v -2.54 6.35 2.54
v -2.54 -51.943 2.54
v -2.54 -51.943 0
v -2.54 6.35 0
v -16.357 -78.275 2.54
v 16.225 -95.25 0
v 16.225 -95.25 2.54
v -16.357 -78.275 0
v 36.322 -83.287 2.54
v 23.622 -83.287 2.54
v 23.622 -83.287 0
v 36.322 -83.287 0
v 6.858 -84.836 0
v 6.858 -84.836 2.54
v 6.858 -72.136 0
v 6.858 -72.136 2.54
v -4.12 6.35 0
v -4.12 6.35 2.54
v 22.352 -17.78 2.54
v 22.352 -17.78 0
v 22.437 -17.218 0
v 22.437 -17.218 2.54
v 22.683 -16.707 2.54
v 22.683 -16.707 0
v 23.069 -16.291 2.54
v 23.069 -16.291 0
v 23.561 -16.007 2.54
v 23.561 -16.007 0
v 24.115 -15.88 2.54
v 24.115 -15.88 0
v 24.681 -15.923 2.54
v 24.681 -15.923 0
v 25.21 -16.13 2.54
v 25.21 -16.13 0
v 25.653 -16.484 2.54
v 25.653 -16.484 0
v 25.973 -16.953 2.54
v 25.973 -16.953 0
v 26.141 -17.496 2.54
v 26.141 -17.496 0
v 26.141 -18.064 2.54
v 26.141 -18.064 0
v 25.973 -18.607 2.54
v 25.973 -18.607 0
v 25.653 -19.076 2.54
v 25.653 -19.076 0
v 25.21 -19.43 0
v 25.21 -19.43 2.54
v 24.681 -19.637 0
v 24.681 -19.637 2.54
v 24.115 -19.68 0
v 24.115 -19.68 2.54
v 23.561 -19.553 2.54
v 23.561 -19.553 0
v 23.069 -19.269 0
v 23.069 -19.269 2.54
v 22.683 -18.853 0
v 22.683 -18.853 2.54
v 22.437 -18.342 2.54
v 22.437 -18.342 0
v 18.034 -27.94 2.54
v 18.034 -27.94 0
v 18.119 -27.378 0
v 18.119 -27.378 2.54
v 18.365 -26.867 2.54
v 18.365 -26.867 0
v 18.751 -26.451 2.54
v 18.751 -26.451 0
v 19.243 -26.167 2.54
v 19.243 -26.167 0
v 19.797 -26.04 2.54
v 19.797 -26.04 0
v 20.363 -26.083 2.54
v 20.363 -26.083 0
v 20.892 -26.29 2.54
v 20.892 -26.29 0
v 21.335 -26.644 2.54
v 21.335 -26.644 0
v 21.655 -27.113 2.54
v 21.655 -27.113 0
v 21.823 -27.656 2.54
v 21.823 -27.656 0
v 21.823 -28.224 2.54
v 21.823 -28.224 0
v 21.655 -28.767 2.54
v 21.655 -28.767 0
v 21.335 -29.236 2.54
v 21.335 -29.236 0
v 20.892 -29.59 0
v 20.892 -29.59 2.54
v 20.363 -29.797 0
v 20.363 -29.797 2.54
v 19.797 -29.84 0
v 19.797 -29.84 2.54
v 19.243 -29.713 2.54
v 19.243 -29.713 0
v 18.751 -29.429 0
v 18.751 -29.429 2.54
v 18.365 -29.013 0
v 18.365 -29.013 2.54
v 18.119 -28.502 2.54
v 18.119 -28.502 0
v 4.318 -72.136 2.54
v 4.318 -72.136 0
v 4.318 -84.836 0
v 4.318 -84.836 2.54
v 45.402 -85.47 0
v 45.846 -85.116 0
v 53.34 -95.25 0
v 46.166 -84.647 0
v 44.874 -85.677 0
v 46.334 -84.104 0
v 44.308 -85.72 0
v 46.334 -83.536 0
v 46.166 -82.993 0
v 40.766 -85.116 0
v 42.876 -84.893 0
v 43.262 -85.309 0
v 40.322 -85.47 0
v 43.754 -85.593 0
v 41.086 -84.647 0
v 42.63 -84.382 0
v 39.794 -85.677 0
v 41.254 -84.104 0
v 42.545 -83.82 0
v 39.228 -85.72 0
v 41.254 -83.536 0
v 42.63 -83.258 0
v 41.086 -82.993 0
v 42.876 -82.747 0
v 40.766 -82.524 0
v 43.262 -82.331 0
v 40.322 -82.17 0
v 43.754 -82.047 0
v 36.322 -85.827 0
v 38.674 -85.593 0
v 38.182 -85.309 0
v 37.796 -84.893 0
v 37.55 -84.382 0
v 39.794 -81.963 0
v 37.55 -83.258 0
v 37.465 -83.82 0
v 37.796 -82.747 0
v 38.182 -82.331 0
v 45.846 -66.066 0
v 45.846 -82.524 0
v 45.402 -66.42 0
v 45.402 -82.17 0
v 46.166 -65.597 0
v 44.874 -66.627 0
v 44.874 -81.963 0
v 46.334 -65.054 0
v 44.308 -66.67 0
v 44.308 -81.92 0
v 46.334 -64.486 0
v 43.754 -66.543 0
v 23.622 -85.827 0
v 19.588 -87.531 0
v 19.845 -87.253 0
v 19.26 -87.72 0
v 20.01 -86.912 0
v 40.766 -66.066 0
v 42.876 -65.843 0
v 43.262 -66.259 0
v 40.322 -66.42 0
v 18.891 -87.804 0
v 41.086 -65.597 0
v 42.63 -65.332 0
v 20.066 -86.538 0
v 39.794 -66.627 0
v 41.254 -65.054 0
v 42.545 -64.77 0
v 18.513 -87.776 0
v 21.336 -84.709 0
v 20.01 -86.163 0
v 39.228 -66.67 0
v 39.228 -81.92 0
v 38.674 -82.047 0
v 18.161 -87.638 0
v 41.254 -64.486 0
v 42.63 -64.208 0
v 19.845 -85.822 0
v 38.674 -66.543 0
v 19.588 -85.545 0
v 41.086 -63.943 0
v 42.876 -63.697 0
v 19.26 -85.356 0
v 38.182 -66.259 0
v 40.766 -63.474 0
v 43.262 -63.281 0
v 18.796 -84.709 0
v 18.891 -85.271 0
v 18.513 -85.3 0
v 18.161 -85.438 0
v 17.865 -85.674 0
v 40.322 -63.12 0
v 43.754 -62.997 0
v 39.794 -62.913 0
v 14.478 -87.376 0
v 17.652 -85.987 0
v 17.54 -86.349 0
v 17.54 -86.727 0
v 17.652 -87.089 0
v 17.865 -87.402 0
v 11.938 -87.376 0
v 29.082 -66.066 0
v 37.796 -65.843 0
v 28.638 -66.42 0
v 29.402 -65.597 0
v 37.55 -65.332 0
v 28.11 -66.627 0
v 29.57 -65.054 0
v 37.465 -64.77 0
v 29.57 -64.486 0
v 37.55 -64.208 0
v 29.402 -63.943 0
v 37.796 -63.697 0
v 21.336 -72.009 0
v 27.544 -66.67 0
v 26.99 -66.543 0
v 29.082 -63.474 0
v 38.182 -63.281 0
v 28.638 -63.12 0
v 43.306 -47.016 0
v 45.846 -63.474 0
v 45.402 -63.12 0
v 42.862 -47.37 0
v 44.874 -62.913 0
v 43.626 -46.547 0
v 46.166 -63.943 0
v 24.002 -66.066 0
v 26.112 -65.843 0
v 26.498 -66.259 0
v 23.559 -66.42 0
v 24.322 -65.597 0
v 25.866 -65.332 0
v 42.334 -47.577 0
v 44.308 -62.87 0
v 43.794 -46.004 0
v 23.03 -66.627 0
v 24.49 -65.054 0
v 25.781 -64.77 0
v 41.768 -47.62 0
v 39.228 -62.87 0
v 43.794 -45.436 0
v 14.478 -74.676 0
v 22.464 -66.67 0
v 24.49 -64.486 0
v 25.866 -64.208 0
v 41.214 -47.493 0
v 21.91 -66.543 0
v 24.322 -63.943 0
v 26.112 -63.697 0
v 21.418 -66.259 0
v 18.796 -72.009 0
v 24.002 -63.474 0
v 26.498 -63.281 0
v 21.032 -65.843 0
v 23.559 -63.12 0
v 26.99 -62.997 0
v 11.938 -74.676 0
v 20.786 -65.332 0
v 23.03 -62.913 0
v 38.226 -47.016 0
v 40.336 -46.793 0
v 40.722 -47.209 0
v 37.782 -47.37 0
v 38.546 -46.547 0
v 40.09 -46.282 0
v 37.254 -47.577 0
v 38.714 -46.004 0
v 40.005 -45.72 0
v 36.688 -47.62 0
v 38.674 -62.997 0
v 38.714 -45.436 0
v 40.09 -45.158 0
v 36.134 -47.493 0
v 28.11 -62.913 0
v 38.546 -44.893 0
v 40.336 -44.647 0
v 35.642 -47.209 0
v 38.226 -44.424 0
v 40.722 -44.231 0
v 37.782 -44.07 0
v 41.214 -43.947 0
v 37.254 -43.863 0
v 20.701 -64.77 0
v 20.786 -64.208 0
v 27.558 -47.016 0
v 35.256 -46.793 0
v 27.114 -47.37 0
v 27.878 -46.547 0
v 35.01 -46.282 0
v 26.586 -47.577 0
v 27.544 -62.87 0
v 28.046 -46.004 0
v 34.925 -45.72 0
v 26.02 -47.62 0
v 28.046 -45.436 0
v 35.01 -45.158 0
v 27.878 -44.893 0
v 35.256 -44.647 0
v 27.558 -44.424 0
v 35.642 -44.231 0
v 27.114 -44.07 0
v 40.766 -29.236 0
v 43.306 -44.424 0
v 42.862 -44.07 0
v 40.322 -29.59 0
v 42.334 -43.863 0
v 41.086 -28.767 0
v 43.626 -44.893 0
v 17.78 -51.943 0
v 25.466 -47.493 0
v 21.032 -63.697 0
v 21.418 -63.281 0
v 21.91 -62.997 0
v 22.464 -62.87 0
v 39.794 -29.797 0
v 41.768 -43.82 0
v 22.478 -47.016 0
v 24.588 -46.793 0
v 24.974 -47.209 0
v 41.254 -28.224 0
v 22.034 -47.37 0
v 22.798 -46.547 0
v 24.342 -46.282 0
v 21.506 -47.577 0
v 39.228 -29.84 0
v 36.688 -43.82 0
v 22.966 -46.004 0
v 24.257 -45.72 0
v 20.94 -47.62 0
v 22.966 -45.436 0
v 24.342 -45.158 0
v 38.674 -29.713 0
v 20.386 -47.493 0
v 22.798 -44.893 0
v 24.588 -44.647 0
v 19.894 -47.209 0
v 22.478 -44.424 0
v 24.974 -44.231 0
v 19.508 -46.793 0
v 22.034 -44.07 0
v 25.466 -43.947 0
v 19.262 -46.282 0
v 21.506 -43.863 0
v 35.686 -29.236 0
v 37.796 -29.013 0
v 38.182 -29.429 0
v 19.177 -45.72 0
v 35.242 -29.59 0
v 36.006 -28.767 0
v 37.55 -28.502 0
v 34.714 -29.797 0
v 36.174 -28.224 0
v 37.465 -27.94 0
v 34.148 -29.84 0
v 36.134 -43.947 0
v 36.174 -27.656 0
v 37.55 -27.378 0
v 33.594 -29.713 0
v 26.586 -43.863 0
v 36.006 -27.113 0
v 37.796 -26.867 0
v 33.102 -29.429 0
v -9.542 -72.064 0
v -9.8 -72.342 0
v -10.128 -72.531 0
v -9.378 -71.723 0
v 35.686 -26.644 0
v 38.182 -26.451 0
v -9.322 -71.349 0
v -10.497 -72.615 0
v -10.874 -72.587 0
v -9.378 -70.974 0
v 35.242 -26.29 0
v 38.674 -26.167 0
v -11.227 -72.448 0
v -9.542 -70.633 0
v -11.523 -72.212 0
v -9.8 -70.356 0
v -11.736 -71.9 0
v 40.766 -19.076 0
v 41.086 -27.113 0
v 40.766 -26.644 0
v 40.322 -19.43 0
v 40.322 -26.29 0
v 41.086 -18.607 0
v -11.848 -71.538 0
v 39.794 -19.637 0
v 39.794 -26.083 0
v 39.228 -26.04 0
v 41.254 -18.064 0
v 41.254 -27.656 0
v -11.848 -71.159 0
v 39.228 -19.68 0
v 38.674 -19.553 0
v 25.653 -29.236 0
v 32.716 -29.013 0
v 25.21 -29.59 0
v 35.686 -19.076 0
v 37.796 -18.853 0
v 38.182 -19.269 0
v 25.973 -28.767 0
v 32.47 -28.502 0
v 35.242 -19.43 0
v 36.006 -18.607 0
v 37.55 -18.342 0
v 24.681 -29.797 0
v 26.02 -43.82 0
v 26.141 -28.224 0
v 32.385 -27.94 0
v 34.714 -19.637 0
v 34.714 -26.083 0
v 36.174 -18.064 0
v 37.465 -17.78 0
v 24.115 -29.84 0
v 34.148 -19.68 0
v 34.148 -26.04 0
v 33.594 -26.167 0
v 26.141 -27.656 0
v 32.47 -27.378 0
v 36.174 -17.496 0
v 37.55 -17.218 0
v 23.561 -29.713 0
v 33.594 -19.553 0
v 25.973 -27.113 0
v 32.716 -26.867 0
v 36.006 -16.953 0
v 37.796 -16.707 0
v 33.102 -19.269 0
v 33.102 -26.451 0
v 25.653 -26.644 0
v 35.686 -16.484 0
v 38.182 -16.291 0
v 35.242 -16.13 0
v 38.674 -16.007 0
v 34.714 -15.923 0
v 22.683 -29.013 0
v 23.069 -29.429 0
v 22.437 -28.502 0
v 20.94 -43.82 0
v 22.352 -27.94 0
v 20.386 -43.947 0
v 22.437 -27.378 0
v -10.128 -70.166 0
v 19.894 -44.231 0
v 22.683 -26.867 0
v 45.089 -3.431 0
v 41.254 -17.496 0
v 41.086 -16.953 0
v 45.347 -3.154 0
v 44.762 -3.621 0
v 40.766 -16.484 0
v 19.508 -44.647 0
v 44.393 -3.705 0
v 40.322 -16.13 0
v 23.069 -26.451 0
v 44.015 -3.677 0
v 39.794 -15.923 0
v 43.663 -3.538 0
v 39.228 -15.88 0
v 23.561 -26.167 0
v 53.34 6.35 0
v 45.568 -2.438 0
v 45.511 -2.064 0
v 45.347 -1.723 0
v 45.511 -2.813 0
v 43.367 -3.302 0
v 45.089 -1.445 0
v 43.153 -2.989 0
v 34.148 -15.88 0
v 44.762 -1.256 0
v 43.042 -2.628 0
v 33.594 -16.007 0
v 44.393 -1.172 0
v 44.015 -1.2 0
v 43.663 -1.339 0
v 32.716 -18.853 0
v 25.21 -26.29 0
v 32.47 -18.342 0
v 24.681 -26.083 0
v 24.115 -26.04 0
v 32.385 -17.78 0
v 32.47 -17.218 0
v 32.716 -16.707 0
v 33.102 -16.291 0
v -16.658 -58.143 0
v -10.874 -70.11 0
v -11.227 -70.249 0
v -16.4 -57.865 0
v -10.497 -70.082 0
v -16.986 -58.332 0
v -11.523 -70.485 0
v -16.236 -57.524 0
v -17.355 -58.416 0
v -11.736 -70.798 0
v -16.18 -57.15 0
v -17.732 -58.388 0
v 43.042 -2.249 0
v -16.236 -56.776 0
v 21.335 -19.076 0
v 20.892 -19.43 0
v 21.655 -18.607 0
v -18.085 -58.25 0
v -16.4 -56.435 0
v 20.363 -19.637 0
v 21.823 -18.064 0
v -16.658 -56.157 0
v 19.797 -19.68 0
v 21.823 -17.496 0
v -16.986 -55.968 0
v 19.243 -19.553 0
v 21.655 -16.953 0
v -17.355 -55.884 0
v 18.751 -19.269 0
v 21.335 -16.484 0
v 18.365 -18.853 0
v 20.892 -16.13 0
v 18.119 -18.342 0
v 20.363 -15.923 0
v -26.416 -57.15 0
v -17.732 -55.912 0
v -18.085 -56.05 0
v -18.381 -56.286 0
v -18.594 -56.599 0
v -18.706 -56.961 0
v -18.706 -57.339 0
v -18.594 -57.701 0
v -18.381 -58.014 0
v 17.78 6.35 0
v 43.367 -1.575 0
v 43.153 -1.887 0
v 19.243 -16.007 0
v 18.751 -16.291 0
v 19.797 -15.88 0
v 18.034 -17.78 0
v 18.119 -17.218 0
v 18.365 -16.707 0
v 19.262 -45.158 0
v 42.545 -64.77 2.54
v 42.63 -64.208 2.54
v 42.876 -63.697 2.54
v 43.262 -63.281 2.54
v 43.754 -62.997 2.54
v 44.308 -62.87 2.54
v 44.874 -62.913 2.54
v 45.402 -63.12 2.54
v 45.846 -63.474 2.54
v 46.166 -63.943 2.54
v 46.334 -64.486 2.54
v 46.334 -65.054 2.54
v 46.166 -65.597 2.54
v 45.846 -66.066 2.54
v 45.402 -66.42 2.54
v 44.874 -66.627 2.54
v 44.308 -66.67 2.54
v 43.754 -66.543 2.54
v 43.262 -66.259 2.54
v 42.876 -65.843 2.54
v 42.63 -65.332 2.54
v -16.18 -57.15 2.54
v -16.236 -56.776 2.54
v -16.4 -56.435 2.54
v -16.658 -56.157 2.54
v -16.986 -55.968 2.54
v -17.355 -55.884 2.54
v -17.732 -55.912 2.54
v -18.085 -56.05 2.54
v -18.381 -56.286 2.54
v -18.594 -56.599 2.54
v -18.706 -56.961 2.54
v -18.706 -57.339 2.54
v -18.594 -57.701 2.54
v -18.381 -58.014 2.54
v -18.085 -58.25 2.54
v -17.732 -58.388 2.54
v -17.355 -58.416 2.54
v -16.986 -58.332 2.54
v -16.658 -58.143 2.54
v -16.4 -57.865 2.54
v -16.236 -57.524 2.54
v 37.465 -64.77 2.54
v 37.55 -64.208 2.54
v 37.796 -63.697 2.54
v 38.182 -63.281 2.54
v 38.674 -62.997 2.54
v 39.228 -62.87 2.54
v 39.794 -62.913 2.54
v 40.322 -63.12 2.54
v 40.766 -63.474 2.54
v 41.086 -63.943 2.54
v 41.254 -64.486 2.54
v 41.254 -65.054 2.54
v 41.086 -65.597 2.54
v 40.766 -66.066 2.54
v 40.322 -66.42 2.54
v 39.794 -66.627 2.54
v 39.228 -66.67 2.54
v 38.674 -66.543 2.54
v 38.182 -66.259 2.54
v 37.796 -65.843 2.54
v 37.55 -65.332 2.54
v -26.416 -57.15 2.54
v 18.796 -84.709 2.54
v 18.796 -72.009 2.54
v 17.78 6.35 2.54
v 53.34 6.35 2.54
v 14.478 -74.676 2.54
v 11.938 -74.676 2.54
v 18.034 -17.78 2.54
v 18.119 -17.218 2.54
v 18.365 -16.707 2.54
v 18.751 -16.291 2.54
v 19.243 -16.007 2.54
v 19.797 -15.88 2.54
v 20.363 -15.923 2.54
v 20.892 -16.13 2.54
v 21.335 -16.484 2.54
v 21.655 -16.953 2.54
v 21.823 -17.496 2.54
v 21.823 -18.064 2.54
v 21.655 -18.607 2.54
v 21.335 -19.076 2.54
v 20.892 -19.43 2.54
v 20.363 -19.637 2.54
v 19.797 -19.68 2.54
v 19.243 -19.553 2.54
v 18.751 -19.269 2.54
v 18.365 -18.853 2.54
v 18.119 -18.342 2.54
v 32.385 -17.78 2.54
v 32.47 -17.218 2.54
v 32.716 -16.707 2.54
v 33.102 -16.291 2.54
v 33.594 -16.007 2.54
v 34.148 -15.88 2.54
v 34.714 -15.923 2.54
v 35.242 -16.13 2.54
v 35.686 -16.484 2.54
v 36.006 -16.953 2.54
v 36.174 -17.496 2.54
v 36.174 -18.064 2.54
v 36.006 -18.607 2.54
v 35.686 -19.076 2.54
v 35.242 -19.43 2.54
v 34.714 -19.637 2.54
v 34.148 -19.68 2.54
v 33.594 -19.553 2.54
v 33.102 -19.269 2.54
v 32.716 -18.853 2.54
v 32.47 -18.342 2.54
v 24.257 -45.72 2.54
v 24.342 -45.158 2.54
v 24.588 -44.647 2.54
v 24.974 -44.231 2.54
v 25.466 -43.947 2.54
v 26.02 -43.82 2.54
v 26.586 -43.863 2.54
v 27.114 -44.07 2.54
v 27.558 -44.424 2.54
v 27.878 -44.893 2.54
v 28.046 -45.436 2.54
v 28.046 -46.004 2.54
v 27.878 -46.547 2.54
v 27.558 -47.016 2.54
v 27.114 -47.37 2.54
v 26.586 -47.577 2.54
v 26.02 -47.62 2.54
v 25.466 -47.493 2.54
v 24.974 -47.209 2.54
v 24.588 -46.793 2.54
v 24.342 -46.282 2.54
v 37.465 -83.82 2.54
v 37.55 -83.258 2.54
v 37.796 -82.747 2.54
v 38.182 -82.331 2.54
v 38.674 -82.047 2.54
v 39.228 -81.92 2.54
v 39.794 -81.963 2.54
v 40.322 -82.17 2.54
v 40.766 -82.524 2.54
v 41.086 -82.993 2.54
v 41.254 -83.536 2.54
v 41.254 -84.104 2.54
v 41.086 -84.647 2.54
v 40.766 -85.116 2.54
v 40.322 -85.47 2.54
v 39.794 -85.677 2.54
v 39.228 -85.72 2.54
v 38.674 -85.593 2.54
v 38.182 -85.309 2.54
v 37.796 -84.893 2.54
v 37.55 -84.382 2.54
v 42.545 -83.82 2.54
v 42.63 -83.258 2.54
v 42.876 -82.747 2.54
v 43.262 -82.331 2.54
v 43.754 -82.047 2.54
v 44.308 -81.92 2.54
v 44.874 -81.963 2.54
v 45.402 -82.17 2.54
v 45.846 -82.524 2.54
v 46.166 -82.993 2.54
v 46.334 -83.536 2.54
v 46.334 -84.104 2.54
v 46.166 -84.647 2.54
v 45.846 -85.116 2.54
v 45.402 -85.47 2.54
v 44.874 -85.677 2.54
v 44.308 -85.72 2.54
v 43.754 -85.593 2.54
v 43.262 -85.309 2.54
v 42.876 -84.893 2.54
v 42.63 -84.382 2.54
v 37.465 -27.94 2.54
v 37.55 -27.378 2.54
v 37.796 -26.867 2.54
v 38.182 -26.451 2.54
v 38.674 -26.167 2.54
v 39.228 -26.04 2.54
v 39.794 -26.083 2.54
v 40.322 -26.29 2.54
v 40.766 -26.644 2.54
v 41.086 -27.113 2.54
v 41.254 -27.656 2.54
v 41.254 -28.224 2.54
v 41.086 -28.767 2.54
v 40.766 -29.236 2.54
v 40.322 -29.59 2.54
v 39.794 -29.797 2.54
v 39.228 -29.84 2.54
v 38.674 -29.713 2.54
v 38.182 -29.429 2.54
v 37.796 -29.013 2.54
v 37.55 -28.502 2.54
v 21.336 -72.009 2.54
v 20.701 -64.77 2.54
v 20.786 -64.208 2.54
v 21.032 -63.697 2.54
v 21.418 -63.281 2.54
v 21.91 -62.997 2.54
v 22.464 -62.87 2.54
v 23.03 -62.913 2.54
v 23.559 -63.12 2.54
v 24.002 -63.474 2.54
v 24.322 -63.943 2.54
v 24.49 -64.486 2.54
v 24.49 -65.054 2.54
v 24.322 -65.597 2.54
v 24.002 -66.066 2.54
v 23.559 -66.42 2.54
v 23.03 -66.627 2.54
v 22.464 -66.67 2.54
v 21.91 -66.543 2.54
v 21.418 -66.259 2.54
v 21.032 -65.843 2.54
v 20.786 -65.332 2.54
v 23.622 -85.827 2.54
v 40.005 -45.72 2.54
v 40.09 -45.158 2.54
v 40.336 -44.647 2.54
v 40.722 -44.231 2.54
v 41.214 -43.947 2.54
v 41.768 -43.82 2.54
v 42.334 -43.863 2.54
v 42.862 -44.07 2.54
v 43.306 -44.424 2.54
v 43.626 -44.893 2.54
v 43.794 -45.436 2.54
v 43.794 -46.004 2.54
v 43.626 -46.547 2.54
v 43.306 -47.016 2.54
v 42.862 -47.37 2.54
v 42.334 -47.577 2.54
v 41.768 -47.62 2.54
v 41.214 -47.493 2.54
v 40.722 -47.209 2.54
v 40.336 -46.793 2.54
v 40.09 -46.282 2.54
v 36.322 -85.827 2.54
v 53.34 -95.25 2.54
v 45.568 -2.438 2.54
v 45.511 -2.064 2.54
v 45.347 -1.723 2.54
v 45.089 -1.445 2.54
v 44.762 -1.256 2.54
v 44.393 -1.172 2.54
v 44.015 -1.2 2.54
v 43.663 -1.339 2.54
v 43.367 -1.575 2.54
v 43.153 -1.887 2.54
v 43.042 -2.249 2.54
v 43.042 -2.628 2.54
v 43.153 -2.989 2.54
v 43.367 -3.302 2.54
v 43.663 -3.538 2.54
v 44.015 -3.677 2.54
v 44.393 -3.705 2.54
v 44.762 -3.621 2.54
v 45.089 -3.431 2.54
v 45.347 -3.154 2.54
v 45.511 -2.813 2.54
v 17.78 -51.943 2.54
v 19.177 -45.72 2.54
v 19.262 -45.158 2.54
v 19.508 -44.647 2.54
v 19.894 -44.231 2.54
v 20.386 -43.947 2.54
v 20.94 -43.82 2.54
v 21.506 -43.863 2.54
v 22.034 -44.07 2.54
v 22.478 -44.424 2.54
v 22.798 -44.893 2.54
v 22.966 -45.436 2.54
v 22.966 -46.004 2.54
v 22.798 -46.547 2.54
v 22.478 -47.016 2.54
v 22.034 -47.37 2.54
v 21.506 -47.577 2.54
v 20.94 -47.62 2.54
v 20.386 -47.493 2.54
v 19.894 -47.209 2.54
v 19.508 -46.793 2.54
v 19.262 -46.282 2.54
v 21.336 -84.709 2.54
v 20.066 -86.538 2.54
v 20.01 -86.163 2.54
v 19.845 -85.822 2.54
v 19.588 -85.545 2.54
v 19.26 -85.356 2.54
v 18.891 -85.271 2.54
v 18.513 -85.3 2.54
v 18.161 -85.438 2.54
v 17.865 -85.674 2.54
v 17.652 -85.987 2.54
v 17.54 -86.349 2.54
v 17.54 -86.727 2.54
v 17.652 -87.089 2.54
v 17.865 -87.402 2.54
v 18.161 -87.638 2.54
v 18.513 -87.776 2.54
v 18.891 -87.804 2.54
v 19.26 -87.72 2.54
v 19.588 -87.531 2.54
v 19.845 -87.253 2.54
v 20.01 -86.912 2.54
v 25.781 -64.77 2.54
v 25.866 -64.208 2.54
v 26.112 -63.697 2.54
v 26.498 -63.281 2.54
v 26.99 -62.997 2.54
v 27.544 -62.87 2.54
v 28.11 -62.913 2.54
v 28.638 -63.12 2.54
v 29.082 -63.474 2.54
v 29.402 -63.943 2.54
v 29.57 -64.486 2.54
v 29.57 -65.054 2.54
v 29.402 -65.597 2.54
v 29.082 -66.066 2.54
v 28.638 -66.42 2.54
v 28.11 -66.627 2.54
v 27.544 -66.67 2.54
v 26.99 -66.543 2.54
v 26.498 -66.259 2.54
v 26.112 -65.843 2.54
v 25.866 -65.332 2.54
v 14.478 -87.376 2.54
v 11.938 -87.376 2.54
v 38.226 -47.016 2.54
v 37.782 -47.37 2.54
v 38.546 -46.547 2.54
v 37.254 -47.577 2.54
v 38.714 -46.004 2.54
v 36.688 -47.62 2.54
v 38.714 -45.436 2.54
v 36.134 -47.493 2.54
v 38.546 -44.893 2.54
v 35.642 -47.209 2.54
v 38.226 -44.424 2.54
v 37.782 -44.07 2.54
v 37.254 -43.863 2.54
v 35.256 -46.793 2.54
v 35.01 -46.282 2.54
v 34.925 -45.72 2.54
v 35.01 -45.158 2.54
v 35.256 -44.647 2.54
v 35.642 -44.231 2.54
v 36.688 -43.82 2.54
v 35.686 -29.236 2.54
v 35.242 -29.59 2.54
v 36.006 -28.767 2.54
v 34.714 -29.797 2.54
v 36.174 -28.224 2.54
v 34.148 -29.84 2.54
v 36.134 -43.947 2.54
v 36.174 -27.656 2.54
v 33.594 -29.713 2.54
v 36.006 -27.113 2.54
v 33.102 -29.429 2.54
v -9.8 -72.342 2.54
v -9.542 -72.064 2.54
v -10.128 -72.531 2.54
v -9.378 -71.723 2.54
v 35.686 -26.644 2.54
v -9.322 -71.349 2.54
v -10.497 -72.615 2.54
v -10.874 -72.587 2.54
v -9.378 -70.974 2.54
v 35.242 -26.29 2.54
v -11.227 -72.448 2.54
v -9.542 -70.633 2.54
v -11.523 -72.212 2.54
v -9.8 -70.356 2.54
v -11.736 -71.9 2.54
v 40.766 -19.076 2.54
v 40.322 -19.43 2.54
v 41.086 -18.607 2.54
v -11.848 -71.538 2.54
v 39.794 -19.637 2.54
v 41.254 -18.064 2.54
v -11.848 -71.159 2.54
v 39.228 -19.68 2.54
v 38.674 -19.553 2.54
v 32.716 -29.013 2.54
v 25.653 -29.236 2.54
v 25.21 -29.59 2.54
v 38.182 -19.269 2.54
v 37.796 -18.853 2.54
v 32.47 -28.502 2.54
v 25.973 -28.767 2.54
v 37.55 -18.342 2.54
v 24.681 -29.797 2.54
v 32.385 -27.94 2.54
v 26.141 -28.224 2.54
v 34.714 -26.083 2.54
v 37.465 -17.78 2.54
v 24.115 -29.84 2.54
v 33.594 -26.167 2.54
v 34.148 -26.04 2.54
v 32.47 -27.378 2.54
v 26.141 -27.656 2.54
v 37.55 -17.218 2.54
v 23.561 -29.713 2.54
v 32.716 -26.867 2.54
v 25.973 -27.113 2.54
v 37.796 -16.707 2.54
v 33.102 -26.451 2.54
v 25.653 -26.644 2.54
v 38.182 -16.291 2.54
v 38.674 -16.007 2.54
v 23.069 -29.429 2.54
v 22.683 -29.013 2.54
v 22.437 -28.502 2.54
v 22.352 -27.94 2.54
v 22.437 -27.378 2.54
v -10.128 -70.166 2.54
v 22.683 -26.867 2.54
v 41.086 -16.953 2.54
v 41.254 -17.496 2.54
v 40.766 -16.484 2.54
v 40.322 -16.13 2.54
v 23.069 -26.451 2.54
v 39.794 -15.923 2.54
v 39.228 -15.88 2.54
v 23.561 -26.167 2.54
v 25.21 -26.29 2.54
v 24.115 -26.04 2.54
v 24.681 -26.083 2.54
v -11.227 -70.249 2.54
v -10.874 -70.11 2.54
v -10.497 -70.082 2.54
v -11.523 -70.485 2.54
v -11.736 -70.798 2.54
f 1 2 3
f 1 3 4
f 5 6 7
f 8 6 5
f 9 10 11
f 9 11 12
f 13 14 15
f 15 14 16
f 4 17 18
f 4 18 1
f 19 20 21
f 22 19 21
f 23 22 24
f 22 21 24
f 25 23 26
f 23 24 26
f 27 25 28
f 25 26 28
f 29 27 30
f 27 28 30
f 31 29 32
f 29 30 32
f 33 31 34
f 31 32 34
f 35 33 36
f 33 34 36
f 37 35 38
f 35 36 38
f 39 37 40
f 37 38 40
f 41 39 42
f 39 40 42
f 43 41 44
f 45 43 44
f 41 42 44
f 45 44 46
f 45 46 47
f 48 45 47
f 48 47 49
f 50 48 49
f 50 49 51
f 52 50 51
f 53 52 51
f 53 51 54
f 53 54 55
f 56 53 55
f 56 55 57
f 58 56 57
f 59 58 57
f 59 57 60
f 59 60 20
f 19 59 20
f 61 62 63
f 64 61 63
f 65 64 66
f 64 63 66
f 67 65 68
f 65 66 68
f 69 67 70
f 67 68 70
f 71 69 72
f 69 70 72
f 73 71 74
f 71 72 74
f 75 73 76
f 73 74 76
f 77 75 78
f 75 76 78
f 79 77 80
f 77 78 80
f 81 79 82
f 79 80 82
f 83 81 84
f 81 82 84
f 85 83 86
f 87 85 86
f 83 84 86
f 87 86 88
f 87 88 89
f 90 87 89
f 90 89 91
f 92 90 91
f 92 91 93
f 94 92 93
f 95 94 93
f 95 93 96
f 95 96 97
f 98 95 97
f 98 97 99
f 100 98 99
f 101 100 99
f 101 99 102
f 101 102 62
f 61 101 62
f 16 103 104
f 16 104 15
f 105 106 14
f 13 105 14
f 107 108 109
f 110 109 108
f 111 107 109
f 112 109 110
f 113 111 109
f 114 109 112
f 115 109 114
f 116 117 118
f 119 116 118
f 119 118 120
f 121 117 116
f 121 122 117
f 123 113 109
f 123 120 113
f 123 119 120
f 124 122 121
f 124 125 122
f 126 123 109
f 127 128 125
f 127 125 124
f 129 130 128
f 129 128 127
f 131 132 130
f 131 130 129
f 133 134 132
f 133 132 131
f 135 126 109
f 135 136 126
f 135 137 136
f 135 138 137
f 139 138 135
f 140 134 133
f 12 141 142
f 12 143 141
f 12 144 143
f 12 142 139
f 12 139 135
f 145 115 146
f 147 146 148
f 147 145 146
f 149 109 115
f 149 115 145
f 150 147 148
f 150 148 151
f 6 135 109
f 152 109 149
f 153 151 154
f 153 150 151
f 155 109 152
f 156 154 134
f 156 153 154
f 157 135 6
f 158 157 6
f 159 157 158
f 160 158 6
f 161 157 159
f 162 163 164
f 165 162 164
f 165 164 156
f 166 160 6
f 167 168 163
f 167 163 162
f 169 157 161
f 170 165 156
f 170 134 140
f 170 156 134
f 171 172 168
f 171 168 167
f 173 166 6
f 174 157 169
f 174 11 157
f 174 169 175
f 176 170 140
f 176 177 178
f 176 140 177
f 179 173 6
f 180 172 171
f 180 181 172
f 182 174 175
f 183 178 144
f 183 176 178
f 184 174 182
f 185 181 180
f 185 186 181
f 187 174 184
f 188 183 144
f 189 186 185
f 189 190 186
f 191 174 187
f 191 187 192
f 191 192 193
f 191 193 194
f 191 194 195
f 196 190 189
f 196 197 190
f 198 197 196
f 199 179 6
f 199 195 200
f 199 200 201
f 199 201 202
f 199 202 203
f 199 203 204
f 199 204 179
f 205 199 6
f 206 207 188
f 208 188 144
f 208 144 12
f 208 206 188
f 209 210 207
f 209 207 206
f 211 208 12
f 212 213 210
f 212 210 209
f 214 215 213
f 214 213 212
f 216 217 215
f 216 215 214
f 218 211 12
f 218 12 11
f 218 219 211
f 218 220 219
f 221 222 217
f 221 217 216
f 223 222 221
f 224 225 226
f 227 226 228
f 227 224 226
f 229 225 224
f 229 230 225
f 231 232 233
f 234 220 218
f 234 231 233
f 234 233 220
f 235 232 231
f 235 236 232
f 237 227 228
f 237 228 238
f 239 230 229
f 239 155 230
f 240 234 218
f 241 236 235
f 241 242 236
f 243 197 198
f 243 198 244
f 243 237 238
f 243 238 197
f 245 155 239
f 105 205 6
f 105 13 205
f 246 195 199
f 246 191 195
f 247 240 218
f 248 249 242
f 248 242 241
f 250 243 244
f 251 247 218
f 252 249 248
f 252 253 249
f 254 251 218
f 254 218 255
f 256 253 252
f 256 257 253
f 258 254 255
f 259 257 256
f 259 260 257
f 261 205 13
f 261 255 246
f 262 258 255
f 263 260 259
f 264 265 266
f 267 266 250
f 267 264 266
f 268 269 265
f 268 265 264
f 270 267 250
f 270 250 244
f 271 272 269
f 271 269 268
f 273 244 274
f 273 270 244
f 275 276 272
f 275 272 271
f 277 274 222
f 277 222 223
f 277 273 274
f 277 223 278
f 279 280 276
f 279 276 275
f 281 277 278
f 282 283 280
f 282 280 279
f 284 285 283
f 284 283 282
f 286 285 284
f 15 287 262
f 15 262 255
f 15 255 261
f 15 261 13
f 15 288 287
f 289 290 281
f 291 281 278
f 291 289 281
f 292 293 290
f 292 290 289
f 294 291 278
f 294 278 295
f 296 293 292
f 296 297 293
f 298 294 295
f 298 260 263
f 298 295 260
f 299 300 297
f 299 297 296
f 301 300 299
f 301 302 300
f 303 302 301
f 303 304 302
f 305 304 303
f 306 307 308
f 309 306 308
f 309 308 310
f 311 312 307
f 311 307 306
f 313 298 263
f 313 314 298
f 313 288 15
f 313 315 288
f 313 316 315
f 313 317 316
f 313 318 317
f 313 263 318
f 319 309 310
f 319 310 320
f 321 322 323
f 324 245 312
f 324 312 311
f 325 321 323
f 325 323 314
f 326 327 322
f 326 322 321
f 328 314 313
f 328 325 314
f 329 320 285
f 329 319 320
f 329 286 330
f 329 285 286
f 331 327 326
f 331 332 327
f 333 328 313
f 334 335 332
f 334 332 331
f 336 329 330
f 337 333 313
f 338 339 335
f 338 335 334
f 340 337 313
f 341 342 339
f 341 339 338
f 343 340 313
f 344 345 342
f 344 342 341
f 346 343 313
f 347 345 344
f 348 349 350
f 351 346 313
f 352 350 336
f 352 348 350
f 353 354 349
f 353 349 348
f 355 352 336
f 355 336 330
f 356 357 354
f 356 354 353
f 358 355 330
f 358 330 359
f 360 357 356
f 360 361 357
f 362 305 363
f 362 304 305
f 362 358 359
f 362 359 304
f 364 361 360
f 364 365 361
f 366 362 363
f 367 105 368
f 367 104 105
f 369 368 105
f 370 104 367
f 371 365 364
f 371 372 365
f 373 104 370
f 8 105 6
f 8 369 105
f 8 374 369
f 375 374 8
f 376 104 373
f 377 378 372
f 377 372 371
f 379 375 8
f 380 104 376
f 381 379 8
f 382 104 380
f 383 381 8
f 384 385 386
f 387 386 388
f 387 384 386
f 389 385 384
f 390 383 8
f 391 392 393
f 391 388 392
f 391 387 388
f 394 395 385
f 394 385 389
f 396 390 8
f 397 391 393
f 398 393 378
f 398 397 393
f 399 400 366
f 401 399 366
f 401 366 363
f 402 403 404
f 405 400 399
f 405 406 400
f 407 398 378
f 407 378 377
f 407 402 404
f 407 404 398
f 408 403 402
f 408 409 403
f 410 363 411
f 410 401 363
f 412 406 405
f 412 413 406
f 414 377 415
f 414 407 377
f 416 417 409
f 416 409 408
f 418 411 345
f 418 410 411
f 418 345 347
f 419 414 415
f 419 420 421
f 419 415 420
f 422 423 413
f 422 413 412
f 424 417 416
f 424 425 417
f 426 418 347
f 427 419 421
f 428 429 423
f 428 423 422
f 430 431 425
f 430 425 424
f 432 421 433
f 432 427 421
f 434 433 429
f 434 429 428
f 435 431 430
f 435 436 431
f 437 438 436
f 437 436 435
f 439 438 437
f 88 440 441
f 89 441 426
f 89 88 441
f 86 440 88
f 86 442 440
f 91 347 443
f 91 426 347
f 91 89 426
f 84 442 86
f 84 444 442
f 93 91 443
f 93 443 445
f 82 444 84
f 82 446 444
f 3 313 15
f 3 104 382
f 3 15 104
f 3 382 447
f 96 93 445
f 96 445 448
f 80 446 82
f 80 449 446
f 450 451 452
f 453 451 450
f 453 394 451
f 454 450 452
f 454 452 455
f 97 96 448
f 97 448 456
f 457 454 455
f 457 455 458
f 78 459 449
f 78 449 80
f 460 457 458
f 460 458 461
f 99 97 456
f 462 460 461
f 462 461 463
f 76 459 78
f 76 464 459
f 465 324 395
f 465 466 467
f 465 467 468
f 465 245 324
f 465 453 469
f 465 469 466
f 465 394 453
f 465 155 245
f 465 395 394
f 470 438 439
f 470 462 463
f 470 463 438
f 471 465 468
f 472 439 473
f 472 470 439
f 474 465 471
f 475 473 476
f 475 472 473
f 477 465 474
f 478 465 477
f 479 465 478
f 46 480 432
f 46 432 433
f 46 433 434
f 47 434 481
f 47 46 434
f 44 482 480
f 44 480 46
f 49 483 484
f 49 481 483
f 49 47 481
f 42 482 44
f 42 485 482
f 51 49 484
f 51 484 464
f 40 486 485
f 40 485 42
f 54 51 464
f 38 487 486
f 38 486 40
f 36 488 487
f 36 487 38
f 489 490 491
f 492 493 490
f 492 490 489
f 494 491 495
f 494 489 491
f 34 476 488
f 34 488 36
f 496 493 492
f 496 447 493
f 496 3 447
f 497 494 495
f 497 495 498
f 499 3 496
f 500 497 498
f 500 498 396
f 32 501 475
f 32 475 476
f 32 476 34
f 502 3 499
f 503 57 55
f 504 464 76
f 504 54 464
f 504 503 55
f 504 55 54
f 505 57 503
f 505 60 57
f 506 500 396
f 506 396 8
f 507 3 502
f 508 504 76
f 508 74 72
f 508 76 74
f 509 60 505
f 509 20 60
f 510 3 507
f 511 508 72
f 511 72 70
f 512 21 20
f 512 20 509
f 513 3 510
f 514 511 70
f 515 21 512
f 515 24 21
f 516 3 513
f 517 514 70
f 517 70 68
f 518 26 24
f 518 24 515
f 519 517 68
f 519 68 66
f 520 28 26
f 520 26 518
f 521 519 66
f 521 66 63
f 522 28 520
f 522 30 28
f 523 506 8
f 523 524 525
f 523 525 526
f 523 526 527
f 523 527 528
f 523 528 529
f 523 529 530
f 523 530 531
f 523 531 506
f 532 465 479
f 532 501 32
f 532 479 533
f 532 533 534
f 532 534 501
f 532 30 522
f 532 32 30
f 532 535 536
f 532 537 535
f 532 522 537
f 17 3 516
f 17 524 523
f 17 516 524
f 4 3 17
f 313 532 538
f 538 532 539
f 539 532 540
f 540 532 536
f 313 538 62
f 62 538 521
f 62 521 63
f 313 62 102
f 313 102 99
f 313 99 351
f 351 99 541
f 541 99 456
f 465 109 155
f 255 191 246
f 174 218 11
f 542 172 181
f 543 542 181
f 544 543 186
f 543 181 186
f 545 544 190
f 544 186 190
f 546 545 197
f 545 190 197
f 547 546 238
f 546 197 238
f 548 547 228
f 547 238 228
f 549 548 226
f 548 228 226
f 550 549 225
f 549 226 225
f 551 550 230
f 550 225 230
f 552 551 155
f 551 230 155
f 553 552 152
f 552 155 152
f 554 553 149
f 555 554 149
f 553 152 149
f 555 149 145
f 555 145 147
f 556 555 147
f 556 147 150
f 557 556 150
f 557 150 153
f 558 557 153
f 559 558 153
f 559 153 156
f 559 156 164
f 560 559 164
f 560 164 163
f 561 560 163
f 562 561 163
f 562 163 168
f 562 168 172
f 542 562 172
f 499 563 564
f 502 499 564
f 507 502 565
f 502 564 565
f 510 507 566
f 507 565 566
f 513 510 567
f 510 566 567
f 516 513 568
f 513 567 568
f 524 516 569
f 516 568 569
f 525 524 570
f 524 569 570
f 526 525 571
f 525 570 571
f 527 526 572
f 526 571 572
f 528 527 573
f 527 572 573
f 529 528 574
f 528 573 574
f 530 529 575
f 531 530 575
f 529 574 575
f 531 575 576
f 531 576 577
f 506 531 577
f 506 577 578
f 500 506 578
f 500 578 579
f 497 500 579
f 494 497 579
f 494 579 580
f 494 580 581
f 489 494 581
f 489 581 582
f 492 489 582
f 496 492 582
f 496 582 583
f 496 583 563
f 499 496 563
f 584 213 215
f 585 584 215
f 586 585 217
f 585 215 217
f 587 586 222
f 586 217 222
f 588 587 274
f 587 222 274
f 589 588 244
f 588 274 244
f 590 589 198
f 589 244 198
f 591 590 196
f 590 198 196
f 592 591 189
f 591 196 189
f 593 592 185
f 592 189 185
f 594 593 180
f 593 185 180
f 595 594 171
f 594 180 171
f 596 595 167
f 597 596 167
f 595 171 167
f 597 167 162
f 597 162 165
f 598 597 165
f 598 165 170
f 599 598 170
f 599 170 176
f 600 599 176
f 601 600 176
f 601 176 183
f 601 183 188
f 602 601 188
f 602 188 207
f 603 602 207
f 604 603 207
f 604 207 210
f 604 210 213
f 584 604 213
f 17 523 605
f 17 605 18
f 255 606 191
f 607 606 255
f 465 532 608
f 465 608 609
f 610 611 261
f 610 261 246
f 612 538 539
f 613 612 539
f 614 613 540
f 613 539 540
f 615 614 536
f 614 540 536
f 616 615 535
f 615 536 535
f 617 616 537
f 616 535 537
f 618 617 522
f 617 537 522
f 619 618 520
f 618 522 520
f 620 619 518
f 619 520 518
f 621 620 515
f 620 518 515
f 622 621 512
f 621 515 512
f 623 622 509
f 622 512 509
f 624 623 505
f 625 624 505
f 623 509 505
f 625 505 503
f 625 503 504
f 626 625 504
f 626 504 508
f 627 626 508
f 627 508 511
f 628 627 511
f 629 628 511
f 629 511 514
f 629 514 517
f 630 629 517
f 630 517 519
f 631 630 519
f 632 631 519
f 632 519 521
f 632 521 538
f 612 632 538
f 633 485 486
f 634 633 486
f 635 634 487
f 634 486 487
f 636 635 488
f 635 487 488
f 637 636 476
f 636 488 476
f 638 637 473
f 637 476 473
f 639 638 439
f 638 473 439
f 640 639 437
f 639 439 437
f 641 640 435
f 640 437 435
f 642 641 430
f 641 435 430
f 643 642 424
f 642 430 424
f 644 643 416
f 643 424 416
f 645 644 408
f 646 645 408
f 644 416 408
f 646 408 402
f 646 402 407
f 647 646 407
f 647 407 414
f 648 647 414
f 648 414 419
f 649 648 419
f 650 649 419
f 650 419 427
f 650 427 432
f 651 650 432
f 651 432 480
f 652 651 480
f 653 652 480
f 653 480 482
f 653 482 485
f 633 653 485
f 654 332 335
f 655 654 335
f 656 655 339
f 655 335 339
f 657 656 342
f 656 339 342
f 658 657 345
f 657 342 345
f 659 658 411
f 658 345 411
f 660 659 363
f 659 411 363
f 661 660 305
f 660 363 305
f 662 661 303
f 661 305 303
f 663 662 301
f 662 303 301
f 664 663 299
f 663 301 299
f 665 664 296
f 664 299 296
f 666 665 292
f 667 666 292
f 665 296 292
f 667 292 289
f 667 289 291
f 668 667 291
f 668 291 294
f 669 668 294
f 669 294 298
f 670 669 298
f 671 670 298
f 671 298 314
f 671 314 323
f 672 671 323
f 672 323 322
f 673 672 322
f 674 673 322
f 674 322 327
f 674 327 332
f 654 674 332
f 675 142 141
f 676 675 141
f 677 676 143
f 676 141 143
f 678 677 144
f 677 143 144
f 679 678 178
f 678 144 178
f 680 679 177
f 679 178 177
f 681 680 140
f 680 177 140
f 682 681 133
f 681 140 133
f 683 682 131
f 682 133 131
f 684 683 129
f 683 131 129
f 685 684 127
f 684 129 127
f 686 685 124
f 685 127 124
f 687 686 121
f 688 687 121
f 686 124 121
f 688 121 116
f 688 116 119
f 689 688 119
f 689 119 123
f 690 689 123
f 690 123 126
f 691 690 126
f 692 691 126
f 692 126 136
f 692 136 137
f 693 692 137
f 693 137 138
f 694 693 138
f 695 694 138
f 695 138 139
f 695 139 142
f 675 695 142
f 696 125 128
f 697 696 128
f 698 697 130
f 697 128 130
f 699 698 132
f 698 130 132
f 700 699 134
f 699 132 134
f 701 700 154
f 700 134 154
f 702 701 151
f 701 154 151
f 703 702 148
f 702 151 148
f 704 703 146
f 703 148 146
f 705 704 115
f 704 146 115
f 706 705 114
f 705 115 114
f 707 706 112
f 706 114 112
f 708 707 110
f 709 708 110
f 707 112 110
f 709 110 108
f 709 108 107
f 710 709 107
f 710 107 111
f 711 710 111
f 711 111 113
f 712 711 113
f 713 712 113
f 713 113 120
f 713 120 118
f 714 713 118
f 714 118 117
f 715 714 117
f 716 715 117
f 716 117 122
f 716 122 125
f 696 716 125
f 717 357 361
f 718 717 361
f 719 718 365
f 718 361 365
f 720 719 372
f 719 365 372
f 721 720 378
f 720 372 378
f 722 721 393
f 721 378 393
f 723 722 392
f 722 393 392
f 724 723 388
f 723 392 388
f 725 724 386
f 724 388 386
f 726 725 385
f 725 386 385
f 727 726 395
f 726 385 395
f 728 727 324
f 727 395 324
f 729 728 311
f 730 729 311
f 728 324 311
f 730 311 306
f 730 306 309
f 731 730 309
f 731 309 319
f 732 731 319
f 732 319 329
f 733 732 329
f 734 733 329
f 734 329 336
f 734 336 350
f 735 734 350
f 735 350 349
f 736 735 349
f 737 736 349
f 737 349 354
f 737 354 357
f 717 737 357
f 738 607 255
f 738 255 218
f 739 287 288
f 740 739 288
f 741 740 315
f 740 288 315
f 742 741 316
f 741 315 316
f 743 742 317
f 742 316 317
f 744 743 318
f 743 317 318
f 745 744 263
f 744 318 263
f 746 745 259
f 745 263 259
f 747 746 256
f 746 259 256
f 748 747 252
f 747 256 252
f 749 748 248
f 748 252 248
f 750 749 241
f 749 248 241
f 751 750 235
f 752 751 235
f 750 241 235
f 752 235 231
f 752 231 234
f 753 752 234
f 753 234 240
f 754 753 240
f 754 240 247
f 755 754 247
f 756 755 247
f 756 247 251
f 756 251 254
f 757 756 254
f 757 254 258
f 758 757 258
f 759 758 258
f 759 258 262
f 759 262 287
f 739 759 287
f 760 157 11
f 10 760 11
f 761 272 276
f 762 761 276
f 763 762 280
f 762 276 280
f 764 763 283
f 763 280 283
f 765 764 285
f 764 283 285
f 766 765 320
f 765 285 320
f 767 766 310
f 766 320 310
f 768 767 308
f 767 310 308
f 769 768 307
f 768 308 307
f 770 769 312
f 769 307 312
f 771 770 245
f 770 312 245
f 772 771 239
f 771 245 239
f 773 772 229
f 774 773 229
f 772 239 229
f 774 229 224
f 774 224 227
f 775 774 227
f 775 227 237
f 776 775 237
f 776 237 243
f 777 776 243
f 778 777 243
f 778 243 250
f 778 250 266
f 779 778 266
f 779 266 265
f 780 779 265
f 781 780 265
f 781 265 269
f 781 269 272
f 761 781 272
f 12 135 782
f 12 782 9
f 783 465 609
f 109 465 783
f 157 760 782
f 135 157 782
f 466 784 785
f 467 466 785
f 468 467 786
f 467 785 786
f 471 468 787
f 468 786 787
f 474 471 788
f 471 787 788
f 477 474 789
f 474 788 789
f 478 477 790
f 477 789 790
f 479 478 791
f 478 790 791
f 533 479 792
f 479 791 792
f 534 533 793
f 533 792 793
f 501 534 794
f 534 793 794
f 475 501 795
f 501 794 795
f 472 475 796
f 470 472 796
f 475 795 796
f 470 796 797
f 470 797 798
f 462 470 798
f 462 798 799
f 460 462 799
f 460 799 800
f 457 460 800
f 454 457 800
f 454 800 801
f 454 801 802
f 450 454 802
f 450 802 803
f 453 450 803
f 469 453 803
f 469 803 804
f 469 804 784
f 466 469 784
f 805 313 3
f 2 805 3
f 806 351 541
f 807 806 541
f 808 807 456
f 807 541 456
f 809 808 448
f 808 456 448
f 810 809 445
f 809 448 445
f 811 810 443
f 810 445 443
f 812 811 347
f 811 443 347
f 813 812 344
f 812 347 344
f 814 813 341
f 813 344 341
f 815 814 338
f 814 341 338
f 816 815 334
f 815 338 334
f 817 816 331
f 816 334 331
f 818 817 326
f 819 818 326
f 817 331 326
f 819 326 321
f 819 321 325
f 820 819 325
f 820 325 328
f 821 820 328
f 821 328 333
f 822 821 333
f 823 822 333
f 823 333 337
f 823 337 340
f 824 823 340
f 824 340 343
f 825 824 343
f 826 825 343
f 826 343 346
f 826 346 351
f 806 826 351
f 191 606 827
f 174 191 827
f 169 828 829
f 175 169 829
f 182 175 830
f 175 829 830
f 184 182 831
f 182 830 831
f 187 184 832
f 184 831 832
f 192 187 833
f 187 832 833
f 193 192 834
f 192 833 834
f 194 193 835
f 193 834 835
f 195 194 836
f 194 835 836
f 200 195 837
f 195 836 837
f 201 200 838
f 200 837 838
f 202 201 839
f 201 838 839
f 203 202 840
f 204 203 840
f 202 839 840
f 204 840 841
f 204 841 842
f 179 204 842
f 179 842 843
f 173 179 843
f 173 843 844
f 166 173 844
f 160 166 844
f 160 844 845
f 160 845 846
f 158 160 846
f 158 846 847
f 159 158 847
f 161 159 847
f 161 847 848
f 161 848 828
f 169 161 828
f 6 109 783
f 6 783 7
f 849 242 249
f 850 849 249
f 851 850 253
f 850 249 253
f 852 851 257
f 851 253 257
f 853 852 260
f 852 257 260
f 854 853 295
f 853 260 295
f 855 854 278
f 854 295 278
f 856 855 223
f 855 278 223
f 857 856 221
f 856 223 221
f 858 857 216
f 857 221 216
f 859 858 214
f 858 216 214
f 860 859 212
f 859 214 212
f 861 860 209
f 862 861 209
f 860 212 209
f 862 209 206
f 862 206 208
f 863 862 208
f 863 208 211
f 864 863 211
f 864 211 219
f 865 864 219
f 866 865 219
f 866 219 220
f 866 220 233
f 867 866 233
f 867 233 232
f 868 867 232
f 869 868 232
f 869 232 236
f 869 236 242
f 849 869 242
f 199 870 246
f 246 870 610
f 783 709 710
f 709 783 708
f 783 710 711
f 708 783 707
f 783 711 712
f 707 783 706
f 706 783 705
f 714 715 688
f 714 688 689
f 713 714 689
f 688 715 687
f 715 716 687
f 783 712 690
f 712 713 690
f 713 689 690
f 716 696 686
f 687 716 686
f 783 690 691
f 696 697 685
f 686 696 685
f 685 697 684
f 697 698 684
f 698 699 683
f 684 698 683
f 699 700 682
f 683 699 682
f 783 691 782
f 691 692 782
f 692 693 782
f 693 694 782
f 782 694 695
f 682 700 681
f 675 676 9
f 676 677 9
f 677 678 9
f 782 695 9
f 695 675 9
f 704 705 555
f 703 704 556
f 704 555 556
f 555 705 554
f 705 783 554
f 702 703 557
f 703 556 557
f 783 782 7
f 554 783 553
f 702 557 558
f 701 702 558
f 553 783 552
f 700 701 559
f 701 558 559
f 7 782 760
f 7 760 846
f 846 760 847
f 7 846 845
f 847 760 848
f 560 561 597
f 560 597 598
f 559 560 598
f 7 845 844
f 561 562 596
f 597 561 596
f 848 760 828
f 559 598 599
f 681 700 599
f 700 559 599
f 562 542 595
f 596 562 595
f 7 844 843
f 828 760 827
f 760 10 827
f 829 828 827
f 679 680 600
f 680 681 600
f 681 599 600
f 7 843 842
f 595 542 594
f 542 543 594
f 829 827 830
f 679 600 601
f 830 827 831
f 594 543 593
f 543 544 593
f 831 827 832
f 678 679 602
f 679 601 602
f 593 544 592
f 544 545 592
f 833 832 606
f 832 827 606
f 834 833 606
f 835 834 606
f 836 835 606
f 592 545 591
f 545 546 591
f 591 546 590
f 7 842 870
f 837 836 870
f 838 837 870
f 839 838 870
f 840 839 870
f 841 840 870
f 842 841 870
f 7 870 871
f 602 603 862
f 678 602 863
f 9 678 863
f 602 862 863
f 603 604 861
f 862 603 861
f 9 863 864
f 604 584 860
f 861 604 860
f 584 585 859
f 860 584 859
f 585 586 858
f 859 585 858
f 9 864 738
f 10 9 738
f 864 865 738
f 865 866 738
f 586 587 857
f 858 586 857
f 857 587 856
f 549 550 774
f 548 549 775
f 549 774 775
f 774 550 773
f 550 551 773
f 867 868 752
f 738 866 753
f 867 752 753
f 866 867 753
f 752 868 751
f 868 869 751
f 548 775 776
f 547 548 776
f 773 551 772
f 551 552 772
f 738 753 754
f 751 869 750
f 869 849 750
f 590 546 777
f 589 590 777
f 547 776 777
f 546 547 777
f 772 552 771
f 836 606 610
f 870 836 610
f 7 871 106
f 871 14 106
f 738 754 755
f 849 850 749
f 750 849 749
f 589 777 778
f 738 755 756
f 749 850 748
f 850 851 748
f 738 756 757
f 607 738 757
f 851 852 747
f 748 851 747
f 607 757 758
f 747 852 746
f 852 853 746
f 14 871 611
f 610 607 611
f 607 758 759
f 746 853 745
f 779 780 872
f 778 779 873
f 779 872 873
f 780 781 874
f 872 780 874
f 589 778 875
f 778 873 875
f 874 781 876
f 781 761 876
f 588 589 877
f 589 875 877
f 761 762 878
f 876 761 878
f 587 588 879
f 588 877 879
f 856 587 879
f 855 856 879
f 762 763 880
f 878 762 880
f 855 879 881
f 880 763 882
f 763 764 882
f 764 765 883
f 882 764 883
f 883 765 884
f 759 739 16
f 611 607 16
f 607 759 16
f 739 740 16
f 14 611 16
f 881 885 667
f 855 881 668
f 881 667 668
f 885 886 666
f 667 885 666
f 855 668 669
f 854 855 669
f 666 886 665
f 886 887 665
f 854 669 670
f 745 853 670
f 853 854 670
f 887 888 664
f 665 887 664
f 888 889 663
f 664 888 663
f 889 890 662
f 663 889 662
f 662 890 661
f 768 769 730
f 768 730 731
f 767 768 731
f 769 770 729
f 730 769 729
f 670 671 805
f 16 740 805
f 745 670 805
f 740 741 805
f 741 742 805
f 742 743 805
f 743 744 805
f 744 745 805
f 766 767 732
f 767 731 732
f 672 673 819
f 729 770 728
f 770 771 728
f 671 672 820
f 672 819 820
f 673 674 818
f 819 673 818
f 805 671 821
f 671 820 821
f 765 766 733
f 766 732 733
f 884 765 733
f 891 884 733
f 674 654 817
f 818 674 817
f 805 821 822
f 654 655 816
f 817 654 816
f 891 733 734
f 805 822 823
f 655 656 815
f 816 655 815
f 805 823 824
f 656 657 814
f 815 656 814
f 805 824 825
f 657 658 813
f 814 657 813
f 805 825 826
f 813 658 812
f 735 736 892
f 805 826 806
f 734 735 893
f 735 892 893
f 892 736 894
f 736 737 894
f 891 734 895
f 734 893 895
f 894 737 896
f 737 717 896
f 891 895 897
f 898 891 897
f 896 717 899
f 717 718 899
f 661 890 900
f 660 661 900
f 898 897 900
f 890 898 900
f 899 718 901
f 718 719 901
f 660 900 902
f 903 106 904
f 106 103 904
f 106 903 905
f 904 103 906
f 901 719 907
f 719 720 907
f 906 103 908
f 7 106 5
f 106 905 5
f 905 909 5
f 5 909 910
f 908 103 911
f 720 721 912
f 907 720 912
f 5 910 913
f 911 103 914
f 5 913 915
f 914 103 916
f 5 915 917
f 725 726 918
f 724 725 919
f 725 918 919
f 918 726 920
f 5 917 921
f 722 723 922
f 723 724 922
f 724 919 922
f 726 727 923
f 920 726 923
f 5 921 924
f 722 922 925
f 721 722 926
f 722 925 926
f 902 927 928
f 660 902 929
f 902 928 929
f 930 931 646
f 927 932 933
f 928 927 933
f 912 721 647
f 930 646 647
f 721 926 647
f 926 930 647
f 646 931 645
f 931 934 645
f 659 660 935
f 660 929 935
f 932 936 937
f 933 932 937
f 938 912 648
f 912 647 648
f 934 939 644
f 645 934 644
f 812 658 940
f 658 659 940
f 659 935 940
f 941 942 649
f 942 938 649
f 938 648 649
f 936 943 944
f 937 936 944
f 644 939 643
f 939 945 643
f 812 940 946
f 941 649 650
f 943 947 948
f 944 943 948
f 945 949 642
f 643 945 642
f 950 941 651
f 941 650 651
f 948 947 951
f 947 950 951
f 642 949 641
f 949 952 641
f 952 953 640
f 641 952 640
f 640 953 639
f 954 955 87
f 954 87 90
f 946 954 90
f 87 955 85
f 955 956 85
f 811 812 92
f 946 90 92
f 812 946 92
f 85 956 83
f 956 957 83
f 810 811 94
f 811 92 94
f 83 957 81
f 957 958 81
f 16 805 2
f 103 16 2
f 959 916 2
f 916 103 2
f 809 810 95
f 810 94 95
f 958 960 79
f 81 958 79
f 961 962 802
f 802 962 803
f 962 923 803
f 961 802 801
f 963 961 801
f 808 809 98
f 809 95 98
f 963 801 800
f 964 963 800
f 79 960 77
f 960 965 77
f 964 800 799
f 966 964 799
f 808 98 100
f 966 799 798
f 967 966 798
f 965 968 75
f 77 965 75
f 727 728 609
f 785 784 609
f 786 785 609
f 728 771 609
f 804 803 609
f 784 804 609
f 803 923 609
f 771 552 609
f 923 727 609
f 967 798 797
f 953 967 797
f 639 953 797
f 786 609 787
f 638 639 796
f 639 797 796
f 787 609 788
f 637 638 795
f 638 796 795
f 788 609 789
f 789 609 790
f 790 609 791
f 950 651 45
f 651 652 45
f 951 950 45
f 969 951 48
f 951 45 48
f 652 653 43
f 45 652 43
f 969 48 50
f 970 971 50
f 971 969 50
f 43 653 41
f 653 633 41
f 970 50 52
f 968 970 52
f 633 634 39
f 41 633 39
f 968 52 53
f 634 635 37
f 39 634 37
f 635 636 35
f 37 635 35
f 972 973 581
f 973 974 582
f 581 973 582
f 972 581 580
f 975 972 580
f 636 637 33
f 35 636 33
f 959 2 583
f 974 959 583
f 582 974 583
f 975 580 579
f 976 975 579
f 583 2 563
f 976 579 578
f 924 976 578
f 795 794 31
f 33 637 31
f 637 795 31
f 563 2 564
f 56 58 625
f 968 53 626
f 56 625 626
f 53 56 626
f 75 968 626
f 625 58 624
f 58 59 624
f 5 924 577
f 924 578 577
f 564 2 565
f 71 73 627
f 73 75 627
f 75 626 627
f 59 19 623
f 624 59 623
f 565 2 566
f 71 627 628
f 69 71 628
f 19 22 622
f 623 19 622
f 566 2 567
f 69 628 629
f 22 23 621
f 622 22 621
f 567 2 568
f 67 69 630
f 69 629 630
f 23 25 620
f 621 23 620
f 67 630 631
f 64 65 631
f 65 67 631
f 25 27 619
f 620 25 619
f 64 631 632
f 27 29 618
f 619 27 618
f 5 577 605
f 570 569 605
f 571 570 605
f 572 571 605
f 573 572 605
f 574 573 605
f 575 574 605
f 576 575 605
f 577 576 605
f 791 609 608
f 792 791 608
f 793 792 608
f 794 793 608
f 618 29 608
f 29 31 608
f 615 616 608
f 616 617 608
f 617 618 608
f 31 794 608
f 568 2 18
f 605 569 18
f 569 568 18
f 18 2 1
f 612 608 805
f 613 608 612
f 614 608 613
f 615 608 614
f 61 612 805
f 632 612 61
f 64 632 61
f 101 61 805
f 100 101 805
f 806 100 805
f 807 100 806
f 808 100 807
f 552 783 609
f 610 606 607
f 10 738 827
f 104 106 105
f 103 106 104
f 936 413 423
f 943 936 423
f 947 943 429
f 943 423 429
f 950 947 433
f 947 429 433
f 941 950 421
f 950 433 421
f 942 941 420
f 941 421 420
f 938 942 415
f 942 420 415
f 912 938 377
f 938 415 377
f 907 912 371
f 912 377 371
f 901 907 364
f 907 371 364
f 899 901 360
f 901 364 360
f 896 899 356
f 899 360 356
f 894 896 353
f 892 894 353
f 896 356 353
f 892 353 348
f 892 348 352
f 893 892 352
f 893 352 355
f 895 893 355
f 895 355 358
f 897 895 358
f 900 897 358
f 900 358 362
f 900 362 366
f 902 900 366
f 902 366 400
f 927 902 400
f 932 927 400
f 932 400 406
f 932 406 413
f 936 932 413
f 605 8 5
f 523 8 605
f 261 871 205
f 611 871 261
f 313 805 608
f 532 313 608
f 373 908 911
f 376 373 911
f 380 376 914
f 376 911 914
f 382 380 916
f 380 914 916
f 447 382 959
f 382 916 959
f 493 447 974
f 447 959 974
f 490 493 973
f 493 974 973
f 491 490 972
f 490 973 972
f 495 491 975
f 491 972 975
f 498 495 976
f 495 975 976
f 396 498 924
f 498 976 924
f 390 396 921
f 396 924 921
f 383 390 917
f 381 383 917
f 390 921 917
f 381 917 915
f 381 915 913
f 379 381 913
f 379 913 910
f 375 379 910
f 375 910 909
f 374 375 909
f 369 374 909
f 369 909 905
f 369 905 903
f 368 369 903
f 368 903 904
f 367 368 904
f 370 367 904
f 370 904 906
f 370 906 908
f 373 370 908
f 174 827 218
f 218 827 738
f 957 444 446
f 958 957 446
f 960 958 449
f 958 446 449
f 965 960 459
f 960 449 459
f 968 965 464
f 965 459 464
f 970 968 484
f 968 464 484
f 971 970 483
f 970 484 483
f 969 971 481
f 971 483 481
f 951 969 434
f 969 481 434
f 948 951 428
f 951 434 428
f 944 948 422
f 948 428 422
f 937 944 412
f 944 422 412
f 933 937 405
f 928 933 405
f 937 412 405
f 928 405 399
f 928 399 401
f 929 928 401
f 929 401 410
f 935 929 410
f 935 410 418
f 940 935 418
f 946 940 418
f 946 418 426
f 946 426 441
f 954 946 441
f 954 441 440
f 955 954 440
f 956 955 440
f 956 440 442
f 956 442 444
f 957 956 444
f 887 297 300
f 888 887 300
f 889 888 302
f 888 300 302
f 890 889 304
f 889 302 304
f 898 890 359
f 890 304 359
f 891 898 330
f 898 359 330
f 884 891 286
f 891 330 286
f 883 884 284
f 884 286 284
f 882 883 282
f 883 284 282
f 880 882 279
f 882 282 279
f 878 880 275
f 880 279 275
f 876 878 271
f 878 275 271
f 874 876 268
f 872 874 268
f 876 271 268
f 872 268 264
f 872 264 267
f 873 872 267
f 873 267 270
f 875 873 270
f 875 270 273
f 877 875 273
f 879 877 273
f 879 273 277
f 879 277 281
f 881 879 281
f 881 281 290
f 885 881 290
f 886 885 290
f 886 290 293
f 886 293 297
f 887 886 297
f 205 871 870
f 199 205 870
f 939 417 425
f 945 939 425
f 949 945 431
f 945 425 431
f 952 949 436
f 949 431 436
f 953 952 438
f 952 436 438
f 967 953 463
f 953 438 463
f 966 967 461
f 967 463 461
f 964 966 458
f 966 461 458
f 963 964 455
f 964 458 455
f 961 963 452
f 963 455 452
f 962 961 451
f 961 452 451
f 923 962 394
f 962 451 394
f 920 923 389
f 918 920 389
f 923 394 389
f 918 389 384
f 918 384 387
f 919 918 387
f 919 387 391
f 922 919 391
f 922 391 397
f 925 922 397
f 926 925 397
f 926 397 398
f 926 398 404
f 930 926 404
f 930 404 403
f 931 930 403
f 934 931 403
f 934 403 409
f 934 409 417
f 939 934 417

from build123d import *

# Parameters (mm, degrees)
BOSS_EXTRUDE1_DEPTH = 2.54
SKETCH4_R           = 1.905
SKETCH4_W           = 20.32
SKETCH4_H           = 50.8
CUT_EXTRUDE2_DEPTH  = 25.4
SKETCH5_W           = 20.32
SKETCH5_H           = 7.493
CUT_EXTRUDE3_DEPTH  = 5.08
SKETCH6_R           = 1.27
CUT_EXTRUDE4_DEPTH  = 5.08
SKETCH8_W           = 12.7
SKETCH8_H           = 2.54
SKETCH8_W_2         = 2.54
SKETCH8_H_2         = 12.7
CUT_EXTRUDE5_DEPTH  = 5.08


with BuildPart() as part:
    # Sketch1 → Boss-Extrude1 (new body)
    with BuildSketch(Plane.XY):
        Polygon((-4.120444444, 6.35), (53.34, 6.35), (53.34, -95.25), (16.22499019, -95.25), (-16.356614113, -78.274710363), (-26.416, -57.15), align=None)
    extrude(amount=BOSS_EXTRUDE1_DEPTH)

    # Sketch4 → Cut-Extrude2 (cut)
    with BuildSketch(Plane(origin=(0, 0, 0), x_dir=(-1, 0, 0), z_dir=(0, 0, -1))):
        with Locations((-39.37, -17.78)):
            Circle(SKETCH4_R)
        with Locations((-34.29, -17.78)):
            Circle(SKETCH4_R)
        with Locations((-39.37, -27.94)):
            Circle(SKETCH4_R)
        with Locations((-34.29, -27.94)):
            Circle(SKETCH4_R)
        with Locations((-41.91, -45.72)):
            Circle(SKETCH4_R)
        with Locations((-36.83, -45.72)):
            Circle(SKETCH4_R)
        with Locations((-44.45, -64.77)):
            Circle(SKETCH4_R)
        with Locations((-39.37, -64.77)):
            Circle(SKETCH4_R)
        with Locations((-44.45, -83.82)):
            Circle(SKETCH4_R)
        with Locations((-39.37, -83.82)):
            Circle(SKETCH4_R)
        with Locations((-24.257, -17.78)):
            Circle(SKETCH4_R)
        with Locations((-19.939, -17.78)):
            Circle(SKETCH4_R)
        with Locations((-24.257, -27.94)):
            Circle(SKETCH4_R)
        with Locations((-19.939, -27.94)):
            Circle(SKETCH4_R)
        with Locations((-26.162, -45.72)):
            Circle(SKETCH4_R)
        with Locations((-21.082, -45.72)):
            Circle(SKETCH4_R)
        with Locations((-27.686, -64.77)):
            Circle(SKETCH4_R)
        with Locations((-22.606, -64.77)):
            Circle(SKETCH4_R)
        with Locations((-7.62, -26.543)):
            Rectangle(SKETCH4_W, SKETCH4_H)
    extrude(amount=-CUT_EXTRUDE2_DEPTH, mode=Mode.SUBTRACT)

    # Sketch5 → Cut-Extrude3 (cut)
    with BuildSketch(Plane.XY.offset(2.54)):
        with Locations((7.62, 2.6035)):
            Rectangle(SKETCH5_W, SKETCH5_H)
    extrude(amount=-CUT_EXTRUDE3_DEPTH, mode=Mode.SUBTRACT)

    # Sketch6 → Cut-Extrude4 (cut)
    with BuildSketch(Plane.XY.offset(2.54)):
        with Locations((1.6002, -2.4384)):
            Circle(SKETCH6_R)
        with Locations((44.2976, -2.4384)):
            Circle(SKETCH6_R)
        with Locations((-17.4498, -57.15)):
            Circle(SKETCH6_R)
        with Locations((-10.5918, -71.3486)):
            Circle(SKETCH6_R)
        with Locations((18.796, -86.5378)):
            Circle(SKETCH6_R)
    extrude(amount=-CUT_EXTRUDE4_DEPTH, mode=Mode.SUBTRACT)

    # Sketch8 → Cut-Extrude5 (cut)
    with BuildSketch(Plane.XY.offset(2.54)):
        with Locations((29.972, -84.5566)):
            Rectangle(SKETCH8_W, SKETCH8_H)
        with Locations((20.066, -78.359)):
            Rectangle(SKETCH8_W_2, SKETCH8_H_2)
        with Locations((13.208, -81.026)):
            Rectangle(SKETCH8_W_2, SKETCH8_H_2)
        with Locations((5.588, -78.486)):
            Rectangle(SKETCH8_W_2, SKETCH8_H_2)
    extrude(amount=-CUT_EXTRUDE5_DEPTH, mode=Mode.SUBTRACT)


solid = part.part
